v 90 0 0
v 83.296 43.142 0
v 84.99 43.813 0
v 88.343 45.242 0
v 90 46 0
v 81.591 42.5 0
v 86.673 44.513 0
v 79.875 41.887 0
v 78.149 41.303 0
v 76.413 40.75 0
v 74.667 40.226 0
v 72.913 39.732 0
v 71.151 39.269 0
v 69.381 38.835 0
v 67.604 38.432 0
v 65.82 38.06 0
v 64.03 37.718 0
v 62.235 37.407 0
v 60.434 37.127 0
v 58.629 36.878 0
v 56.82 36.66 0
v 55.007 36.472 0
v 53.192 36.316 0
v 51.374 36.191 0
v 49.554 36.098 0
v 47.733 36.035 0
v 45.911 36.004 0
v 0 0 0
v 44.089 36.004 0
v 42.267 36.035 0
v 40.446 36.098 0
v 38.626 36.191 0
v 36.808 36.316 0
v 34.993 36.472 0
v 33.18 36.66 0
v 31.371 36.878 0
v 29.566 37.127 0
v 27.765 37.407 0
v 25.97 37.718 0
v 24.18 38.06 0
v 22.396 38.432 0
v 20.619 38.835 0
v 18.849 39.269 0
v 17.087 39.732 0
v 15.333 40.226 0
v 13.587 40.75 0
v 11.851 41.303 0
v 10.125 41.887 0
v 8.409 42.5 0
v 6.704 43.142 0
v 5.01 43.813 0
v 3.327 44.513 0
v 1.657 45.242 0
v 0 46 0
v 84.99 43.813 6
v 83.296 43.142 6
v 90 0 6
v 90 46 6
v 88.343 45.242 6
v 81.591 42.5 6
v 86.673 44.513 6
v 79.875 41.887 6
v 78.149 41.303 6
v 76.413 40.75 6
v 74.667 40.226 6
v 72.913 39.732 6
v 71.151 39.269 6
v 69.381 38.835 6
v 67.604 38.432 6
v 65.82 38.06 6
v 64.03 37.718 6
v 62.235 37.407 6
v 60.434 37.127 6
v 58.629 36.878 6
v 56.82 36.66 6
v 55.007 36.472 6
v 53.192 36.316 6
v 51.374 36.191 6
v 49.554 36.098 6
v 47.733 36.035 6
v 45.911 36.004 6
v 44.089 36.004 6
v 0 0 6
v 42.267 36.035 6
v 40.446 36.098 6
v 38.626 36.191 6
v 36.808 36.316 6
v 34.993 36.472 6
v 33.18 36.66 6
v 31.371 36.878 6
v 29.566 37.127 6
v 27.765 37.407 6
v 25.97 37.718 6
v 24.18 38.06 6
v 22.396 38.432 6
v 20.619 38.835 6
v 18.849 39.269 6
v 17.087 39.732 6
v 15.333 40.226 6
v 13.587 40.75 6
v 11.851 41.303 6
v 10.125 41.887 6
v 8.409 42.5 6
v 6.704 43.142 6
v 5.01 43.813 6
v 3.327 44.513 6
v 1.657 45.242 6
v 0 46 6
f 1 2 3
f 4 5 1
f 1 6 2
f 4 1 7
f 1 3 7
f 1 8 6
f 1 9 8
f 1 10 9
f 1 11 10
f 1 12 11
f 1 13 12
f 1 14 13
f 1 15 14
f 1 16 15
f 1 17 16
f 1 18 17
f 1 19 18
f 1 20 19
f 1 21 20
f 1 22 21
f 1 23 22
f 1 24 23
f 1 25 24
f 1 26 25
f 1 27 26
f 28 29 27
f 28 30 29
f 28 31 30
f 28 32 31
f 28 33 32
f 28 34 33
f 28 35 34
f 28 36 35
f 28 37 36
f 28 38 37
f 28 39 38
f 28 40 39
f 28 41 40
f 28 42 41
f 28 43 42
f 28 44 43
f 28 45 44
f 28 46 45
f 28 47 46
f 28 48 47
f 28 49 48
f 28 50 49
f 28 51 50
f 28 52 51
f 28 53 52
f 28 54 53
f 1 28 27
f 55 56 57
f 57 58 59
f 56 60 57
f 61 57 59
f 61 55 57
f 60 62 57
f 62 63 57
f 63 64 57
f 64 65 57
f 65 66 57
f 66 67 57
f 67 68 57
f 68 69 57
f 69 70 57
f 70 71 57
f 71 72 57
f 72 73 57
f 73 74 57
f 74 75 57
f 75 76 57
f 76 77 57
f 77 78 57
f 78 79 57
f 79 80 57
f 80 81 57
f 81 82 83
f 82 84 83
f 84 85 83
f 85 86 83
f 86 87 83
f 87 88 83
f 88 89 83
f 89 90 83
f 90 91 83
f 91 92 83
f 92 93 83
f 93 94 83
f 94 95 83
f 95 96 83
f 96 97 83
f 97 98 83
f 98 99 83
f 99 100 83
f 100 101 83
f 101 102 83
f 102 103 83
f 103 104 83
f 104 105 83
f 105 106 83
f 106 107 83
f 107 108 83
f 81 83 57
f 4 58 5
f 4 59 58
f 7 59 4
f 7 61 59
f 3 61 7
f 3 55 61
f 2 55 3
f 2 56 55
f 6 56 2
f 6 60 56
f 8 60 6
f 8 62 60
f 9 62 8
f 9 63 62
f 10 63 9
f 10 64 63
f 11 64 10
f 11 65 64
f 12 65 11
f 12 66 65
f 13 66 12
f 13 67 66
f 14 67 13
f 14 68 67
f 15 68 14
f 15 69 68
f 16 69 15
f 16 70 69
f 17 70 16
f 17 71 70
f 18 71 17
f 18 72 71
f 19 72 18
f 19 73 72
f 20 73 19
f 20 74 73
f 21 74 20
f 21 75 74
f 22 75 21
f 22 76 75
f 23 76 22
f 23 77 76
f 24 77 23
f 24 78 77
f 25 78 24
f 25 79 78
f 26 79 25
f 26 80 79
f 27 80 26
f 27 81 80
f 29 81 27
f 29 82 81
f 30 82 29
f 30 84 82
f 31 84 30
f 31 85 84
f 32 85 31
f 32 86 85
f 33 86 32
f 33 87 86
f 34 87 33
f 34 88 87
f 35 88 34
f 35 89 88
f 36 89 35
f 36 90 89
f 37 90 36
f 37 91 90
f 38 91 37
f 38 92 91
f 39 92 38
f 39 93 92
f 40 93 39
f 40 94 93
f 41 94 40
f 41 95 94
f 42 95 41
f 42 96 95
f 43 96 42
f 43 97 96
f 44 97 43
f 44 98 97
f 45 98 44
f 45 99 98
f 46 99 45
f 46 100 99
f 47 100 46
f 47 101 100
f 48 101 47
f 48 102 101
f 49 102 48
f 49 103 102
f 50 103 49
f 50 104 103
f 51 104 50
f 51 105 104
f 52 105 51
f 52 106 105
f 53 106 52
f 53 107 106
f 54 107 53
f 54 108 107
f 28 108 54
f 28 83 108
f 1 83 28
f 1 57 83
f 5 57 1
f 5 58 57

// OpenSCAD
$fn = 32;

// ----------------------------------------------------------------------
// Arc profile plate: notch, 54 points
// ----------------------------------------------------------------------

// --- parameters (mm) ---
bar_l = 90;               // bar length, X
bar_w = 46;               // bar width, Y
notch_depth = 10;         // depth of the arc notch at mid-span
arc_r = 106.25;           // radius of the notch arc
arc_angle = 50.12;        // notch arc angle, degrees
arc_step = 1;             // sampling step of the notch arc, degrees
plate_t = 6;              // plate thickness, Z

profile = [[0, 0], [90, 0], [90, 46], [88.343, 45.242], [86.673, 44.513], [84.99, 43.813], [83.296, 43.142], [81.591, 42.5], [79.875, 41.887], [78.149, 41.303], [76.413, 40.75], [74.667, 40.226], [72.913, 39.732], [71.151, 39.269], [69.381, 38.835], [67.604, 38.432], [65.82, 38.06], [64.03, 37.718], [62.235, 37.407], [60.434, 37.127], [58.629, 36.878], [56.82, 36.66], [55.007, 36.472], [53.192, 36.316], [51.374, 36.191], [49.554, 36.098], [47.733, 36.035], [45.911, 36.004], [44.089, 36.004], [42.267, 36.035], [40.446, 36.098], [38.626, 36.191], [36.808, 36.316], [34.993, 36.472], [33.18, 36.66], [31.371, 36.878], [29.566, 37.127], [27.765, 37.407], [25.97, 37.718], [24.18, 38.06], [22.396, 38.432], [20.619, 38.835], [18.849, 39.269], [17.087, 39.732], [15.333, 40.226], [13.587, 40.75], [11.851, 41.303], [10.125, 41.887], [8.409, 42.5], [6.704, 43.142], [5.01, 43.813], [3.327, 44.513], [1.657, 45.242], [0, 46]];  // primary outline, 54 points, counter clockwise

// --- the one profile operation ---
linear_extrude(height = plate_t) polygon(points = profile);
